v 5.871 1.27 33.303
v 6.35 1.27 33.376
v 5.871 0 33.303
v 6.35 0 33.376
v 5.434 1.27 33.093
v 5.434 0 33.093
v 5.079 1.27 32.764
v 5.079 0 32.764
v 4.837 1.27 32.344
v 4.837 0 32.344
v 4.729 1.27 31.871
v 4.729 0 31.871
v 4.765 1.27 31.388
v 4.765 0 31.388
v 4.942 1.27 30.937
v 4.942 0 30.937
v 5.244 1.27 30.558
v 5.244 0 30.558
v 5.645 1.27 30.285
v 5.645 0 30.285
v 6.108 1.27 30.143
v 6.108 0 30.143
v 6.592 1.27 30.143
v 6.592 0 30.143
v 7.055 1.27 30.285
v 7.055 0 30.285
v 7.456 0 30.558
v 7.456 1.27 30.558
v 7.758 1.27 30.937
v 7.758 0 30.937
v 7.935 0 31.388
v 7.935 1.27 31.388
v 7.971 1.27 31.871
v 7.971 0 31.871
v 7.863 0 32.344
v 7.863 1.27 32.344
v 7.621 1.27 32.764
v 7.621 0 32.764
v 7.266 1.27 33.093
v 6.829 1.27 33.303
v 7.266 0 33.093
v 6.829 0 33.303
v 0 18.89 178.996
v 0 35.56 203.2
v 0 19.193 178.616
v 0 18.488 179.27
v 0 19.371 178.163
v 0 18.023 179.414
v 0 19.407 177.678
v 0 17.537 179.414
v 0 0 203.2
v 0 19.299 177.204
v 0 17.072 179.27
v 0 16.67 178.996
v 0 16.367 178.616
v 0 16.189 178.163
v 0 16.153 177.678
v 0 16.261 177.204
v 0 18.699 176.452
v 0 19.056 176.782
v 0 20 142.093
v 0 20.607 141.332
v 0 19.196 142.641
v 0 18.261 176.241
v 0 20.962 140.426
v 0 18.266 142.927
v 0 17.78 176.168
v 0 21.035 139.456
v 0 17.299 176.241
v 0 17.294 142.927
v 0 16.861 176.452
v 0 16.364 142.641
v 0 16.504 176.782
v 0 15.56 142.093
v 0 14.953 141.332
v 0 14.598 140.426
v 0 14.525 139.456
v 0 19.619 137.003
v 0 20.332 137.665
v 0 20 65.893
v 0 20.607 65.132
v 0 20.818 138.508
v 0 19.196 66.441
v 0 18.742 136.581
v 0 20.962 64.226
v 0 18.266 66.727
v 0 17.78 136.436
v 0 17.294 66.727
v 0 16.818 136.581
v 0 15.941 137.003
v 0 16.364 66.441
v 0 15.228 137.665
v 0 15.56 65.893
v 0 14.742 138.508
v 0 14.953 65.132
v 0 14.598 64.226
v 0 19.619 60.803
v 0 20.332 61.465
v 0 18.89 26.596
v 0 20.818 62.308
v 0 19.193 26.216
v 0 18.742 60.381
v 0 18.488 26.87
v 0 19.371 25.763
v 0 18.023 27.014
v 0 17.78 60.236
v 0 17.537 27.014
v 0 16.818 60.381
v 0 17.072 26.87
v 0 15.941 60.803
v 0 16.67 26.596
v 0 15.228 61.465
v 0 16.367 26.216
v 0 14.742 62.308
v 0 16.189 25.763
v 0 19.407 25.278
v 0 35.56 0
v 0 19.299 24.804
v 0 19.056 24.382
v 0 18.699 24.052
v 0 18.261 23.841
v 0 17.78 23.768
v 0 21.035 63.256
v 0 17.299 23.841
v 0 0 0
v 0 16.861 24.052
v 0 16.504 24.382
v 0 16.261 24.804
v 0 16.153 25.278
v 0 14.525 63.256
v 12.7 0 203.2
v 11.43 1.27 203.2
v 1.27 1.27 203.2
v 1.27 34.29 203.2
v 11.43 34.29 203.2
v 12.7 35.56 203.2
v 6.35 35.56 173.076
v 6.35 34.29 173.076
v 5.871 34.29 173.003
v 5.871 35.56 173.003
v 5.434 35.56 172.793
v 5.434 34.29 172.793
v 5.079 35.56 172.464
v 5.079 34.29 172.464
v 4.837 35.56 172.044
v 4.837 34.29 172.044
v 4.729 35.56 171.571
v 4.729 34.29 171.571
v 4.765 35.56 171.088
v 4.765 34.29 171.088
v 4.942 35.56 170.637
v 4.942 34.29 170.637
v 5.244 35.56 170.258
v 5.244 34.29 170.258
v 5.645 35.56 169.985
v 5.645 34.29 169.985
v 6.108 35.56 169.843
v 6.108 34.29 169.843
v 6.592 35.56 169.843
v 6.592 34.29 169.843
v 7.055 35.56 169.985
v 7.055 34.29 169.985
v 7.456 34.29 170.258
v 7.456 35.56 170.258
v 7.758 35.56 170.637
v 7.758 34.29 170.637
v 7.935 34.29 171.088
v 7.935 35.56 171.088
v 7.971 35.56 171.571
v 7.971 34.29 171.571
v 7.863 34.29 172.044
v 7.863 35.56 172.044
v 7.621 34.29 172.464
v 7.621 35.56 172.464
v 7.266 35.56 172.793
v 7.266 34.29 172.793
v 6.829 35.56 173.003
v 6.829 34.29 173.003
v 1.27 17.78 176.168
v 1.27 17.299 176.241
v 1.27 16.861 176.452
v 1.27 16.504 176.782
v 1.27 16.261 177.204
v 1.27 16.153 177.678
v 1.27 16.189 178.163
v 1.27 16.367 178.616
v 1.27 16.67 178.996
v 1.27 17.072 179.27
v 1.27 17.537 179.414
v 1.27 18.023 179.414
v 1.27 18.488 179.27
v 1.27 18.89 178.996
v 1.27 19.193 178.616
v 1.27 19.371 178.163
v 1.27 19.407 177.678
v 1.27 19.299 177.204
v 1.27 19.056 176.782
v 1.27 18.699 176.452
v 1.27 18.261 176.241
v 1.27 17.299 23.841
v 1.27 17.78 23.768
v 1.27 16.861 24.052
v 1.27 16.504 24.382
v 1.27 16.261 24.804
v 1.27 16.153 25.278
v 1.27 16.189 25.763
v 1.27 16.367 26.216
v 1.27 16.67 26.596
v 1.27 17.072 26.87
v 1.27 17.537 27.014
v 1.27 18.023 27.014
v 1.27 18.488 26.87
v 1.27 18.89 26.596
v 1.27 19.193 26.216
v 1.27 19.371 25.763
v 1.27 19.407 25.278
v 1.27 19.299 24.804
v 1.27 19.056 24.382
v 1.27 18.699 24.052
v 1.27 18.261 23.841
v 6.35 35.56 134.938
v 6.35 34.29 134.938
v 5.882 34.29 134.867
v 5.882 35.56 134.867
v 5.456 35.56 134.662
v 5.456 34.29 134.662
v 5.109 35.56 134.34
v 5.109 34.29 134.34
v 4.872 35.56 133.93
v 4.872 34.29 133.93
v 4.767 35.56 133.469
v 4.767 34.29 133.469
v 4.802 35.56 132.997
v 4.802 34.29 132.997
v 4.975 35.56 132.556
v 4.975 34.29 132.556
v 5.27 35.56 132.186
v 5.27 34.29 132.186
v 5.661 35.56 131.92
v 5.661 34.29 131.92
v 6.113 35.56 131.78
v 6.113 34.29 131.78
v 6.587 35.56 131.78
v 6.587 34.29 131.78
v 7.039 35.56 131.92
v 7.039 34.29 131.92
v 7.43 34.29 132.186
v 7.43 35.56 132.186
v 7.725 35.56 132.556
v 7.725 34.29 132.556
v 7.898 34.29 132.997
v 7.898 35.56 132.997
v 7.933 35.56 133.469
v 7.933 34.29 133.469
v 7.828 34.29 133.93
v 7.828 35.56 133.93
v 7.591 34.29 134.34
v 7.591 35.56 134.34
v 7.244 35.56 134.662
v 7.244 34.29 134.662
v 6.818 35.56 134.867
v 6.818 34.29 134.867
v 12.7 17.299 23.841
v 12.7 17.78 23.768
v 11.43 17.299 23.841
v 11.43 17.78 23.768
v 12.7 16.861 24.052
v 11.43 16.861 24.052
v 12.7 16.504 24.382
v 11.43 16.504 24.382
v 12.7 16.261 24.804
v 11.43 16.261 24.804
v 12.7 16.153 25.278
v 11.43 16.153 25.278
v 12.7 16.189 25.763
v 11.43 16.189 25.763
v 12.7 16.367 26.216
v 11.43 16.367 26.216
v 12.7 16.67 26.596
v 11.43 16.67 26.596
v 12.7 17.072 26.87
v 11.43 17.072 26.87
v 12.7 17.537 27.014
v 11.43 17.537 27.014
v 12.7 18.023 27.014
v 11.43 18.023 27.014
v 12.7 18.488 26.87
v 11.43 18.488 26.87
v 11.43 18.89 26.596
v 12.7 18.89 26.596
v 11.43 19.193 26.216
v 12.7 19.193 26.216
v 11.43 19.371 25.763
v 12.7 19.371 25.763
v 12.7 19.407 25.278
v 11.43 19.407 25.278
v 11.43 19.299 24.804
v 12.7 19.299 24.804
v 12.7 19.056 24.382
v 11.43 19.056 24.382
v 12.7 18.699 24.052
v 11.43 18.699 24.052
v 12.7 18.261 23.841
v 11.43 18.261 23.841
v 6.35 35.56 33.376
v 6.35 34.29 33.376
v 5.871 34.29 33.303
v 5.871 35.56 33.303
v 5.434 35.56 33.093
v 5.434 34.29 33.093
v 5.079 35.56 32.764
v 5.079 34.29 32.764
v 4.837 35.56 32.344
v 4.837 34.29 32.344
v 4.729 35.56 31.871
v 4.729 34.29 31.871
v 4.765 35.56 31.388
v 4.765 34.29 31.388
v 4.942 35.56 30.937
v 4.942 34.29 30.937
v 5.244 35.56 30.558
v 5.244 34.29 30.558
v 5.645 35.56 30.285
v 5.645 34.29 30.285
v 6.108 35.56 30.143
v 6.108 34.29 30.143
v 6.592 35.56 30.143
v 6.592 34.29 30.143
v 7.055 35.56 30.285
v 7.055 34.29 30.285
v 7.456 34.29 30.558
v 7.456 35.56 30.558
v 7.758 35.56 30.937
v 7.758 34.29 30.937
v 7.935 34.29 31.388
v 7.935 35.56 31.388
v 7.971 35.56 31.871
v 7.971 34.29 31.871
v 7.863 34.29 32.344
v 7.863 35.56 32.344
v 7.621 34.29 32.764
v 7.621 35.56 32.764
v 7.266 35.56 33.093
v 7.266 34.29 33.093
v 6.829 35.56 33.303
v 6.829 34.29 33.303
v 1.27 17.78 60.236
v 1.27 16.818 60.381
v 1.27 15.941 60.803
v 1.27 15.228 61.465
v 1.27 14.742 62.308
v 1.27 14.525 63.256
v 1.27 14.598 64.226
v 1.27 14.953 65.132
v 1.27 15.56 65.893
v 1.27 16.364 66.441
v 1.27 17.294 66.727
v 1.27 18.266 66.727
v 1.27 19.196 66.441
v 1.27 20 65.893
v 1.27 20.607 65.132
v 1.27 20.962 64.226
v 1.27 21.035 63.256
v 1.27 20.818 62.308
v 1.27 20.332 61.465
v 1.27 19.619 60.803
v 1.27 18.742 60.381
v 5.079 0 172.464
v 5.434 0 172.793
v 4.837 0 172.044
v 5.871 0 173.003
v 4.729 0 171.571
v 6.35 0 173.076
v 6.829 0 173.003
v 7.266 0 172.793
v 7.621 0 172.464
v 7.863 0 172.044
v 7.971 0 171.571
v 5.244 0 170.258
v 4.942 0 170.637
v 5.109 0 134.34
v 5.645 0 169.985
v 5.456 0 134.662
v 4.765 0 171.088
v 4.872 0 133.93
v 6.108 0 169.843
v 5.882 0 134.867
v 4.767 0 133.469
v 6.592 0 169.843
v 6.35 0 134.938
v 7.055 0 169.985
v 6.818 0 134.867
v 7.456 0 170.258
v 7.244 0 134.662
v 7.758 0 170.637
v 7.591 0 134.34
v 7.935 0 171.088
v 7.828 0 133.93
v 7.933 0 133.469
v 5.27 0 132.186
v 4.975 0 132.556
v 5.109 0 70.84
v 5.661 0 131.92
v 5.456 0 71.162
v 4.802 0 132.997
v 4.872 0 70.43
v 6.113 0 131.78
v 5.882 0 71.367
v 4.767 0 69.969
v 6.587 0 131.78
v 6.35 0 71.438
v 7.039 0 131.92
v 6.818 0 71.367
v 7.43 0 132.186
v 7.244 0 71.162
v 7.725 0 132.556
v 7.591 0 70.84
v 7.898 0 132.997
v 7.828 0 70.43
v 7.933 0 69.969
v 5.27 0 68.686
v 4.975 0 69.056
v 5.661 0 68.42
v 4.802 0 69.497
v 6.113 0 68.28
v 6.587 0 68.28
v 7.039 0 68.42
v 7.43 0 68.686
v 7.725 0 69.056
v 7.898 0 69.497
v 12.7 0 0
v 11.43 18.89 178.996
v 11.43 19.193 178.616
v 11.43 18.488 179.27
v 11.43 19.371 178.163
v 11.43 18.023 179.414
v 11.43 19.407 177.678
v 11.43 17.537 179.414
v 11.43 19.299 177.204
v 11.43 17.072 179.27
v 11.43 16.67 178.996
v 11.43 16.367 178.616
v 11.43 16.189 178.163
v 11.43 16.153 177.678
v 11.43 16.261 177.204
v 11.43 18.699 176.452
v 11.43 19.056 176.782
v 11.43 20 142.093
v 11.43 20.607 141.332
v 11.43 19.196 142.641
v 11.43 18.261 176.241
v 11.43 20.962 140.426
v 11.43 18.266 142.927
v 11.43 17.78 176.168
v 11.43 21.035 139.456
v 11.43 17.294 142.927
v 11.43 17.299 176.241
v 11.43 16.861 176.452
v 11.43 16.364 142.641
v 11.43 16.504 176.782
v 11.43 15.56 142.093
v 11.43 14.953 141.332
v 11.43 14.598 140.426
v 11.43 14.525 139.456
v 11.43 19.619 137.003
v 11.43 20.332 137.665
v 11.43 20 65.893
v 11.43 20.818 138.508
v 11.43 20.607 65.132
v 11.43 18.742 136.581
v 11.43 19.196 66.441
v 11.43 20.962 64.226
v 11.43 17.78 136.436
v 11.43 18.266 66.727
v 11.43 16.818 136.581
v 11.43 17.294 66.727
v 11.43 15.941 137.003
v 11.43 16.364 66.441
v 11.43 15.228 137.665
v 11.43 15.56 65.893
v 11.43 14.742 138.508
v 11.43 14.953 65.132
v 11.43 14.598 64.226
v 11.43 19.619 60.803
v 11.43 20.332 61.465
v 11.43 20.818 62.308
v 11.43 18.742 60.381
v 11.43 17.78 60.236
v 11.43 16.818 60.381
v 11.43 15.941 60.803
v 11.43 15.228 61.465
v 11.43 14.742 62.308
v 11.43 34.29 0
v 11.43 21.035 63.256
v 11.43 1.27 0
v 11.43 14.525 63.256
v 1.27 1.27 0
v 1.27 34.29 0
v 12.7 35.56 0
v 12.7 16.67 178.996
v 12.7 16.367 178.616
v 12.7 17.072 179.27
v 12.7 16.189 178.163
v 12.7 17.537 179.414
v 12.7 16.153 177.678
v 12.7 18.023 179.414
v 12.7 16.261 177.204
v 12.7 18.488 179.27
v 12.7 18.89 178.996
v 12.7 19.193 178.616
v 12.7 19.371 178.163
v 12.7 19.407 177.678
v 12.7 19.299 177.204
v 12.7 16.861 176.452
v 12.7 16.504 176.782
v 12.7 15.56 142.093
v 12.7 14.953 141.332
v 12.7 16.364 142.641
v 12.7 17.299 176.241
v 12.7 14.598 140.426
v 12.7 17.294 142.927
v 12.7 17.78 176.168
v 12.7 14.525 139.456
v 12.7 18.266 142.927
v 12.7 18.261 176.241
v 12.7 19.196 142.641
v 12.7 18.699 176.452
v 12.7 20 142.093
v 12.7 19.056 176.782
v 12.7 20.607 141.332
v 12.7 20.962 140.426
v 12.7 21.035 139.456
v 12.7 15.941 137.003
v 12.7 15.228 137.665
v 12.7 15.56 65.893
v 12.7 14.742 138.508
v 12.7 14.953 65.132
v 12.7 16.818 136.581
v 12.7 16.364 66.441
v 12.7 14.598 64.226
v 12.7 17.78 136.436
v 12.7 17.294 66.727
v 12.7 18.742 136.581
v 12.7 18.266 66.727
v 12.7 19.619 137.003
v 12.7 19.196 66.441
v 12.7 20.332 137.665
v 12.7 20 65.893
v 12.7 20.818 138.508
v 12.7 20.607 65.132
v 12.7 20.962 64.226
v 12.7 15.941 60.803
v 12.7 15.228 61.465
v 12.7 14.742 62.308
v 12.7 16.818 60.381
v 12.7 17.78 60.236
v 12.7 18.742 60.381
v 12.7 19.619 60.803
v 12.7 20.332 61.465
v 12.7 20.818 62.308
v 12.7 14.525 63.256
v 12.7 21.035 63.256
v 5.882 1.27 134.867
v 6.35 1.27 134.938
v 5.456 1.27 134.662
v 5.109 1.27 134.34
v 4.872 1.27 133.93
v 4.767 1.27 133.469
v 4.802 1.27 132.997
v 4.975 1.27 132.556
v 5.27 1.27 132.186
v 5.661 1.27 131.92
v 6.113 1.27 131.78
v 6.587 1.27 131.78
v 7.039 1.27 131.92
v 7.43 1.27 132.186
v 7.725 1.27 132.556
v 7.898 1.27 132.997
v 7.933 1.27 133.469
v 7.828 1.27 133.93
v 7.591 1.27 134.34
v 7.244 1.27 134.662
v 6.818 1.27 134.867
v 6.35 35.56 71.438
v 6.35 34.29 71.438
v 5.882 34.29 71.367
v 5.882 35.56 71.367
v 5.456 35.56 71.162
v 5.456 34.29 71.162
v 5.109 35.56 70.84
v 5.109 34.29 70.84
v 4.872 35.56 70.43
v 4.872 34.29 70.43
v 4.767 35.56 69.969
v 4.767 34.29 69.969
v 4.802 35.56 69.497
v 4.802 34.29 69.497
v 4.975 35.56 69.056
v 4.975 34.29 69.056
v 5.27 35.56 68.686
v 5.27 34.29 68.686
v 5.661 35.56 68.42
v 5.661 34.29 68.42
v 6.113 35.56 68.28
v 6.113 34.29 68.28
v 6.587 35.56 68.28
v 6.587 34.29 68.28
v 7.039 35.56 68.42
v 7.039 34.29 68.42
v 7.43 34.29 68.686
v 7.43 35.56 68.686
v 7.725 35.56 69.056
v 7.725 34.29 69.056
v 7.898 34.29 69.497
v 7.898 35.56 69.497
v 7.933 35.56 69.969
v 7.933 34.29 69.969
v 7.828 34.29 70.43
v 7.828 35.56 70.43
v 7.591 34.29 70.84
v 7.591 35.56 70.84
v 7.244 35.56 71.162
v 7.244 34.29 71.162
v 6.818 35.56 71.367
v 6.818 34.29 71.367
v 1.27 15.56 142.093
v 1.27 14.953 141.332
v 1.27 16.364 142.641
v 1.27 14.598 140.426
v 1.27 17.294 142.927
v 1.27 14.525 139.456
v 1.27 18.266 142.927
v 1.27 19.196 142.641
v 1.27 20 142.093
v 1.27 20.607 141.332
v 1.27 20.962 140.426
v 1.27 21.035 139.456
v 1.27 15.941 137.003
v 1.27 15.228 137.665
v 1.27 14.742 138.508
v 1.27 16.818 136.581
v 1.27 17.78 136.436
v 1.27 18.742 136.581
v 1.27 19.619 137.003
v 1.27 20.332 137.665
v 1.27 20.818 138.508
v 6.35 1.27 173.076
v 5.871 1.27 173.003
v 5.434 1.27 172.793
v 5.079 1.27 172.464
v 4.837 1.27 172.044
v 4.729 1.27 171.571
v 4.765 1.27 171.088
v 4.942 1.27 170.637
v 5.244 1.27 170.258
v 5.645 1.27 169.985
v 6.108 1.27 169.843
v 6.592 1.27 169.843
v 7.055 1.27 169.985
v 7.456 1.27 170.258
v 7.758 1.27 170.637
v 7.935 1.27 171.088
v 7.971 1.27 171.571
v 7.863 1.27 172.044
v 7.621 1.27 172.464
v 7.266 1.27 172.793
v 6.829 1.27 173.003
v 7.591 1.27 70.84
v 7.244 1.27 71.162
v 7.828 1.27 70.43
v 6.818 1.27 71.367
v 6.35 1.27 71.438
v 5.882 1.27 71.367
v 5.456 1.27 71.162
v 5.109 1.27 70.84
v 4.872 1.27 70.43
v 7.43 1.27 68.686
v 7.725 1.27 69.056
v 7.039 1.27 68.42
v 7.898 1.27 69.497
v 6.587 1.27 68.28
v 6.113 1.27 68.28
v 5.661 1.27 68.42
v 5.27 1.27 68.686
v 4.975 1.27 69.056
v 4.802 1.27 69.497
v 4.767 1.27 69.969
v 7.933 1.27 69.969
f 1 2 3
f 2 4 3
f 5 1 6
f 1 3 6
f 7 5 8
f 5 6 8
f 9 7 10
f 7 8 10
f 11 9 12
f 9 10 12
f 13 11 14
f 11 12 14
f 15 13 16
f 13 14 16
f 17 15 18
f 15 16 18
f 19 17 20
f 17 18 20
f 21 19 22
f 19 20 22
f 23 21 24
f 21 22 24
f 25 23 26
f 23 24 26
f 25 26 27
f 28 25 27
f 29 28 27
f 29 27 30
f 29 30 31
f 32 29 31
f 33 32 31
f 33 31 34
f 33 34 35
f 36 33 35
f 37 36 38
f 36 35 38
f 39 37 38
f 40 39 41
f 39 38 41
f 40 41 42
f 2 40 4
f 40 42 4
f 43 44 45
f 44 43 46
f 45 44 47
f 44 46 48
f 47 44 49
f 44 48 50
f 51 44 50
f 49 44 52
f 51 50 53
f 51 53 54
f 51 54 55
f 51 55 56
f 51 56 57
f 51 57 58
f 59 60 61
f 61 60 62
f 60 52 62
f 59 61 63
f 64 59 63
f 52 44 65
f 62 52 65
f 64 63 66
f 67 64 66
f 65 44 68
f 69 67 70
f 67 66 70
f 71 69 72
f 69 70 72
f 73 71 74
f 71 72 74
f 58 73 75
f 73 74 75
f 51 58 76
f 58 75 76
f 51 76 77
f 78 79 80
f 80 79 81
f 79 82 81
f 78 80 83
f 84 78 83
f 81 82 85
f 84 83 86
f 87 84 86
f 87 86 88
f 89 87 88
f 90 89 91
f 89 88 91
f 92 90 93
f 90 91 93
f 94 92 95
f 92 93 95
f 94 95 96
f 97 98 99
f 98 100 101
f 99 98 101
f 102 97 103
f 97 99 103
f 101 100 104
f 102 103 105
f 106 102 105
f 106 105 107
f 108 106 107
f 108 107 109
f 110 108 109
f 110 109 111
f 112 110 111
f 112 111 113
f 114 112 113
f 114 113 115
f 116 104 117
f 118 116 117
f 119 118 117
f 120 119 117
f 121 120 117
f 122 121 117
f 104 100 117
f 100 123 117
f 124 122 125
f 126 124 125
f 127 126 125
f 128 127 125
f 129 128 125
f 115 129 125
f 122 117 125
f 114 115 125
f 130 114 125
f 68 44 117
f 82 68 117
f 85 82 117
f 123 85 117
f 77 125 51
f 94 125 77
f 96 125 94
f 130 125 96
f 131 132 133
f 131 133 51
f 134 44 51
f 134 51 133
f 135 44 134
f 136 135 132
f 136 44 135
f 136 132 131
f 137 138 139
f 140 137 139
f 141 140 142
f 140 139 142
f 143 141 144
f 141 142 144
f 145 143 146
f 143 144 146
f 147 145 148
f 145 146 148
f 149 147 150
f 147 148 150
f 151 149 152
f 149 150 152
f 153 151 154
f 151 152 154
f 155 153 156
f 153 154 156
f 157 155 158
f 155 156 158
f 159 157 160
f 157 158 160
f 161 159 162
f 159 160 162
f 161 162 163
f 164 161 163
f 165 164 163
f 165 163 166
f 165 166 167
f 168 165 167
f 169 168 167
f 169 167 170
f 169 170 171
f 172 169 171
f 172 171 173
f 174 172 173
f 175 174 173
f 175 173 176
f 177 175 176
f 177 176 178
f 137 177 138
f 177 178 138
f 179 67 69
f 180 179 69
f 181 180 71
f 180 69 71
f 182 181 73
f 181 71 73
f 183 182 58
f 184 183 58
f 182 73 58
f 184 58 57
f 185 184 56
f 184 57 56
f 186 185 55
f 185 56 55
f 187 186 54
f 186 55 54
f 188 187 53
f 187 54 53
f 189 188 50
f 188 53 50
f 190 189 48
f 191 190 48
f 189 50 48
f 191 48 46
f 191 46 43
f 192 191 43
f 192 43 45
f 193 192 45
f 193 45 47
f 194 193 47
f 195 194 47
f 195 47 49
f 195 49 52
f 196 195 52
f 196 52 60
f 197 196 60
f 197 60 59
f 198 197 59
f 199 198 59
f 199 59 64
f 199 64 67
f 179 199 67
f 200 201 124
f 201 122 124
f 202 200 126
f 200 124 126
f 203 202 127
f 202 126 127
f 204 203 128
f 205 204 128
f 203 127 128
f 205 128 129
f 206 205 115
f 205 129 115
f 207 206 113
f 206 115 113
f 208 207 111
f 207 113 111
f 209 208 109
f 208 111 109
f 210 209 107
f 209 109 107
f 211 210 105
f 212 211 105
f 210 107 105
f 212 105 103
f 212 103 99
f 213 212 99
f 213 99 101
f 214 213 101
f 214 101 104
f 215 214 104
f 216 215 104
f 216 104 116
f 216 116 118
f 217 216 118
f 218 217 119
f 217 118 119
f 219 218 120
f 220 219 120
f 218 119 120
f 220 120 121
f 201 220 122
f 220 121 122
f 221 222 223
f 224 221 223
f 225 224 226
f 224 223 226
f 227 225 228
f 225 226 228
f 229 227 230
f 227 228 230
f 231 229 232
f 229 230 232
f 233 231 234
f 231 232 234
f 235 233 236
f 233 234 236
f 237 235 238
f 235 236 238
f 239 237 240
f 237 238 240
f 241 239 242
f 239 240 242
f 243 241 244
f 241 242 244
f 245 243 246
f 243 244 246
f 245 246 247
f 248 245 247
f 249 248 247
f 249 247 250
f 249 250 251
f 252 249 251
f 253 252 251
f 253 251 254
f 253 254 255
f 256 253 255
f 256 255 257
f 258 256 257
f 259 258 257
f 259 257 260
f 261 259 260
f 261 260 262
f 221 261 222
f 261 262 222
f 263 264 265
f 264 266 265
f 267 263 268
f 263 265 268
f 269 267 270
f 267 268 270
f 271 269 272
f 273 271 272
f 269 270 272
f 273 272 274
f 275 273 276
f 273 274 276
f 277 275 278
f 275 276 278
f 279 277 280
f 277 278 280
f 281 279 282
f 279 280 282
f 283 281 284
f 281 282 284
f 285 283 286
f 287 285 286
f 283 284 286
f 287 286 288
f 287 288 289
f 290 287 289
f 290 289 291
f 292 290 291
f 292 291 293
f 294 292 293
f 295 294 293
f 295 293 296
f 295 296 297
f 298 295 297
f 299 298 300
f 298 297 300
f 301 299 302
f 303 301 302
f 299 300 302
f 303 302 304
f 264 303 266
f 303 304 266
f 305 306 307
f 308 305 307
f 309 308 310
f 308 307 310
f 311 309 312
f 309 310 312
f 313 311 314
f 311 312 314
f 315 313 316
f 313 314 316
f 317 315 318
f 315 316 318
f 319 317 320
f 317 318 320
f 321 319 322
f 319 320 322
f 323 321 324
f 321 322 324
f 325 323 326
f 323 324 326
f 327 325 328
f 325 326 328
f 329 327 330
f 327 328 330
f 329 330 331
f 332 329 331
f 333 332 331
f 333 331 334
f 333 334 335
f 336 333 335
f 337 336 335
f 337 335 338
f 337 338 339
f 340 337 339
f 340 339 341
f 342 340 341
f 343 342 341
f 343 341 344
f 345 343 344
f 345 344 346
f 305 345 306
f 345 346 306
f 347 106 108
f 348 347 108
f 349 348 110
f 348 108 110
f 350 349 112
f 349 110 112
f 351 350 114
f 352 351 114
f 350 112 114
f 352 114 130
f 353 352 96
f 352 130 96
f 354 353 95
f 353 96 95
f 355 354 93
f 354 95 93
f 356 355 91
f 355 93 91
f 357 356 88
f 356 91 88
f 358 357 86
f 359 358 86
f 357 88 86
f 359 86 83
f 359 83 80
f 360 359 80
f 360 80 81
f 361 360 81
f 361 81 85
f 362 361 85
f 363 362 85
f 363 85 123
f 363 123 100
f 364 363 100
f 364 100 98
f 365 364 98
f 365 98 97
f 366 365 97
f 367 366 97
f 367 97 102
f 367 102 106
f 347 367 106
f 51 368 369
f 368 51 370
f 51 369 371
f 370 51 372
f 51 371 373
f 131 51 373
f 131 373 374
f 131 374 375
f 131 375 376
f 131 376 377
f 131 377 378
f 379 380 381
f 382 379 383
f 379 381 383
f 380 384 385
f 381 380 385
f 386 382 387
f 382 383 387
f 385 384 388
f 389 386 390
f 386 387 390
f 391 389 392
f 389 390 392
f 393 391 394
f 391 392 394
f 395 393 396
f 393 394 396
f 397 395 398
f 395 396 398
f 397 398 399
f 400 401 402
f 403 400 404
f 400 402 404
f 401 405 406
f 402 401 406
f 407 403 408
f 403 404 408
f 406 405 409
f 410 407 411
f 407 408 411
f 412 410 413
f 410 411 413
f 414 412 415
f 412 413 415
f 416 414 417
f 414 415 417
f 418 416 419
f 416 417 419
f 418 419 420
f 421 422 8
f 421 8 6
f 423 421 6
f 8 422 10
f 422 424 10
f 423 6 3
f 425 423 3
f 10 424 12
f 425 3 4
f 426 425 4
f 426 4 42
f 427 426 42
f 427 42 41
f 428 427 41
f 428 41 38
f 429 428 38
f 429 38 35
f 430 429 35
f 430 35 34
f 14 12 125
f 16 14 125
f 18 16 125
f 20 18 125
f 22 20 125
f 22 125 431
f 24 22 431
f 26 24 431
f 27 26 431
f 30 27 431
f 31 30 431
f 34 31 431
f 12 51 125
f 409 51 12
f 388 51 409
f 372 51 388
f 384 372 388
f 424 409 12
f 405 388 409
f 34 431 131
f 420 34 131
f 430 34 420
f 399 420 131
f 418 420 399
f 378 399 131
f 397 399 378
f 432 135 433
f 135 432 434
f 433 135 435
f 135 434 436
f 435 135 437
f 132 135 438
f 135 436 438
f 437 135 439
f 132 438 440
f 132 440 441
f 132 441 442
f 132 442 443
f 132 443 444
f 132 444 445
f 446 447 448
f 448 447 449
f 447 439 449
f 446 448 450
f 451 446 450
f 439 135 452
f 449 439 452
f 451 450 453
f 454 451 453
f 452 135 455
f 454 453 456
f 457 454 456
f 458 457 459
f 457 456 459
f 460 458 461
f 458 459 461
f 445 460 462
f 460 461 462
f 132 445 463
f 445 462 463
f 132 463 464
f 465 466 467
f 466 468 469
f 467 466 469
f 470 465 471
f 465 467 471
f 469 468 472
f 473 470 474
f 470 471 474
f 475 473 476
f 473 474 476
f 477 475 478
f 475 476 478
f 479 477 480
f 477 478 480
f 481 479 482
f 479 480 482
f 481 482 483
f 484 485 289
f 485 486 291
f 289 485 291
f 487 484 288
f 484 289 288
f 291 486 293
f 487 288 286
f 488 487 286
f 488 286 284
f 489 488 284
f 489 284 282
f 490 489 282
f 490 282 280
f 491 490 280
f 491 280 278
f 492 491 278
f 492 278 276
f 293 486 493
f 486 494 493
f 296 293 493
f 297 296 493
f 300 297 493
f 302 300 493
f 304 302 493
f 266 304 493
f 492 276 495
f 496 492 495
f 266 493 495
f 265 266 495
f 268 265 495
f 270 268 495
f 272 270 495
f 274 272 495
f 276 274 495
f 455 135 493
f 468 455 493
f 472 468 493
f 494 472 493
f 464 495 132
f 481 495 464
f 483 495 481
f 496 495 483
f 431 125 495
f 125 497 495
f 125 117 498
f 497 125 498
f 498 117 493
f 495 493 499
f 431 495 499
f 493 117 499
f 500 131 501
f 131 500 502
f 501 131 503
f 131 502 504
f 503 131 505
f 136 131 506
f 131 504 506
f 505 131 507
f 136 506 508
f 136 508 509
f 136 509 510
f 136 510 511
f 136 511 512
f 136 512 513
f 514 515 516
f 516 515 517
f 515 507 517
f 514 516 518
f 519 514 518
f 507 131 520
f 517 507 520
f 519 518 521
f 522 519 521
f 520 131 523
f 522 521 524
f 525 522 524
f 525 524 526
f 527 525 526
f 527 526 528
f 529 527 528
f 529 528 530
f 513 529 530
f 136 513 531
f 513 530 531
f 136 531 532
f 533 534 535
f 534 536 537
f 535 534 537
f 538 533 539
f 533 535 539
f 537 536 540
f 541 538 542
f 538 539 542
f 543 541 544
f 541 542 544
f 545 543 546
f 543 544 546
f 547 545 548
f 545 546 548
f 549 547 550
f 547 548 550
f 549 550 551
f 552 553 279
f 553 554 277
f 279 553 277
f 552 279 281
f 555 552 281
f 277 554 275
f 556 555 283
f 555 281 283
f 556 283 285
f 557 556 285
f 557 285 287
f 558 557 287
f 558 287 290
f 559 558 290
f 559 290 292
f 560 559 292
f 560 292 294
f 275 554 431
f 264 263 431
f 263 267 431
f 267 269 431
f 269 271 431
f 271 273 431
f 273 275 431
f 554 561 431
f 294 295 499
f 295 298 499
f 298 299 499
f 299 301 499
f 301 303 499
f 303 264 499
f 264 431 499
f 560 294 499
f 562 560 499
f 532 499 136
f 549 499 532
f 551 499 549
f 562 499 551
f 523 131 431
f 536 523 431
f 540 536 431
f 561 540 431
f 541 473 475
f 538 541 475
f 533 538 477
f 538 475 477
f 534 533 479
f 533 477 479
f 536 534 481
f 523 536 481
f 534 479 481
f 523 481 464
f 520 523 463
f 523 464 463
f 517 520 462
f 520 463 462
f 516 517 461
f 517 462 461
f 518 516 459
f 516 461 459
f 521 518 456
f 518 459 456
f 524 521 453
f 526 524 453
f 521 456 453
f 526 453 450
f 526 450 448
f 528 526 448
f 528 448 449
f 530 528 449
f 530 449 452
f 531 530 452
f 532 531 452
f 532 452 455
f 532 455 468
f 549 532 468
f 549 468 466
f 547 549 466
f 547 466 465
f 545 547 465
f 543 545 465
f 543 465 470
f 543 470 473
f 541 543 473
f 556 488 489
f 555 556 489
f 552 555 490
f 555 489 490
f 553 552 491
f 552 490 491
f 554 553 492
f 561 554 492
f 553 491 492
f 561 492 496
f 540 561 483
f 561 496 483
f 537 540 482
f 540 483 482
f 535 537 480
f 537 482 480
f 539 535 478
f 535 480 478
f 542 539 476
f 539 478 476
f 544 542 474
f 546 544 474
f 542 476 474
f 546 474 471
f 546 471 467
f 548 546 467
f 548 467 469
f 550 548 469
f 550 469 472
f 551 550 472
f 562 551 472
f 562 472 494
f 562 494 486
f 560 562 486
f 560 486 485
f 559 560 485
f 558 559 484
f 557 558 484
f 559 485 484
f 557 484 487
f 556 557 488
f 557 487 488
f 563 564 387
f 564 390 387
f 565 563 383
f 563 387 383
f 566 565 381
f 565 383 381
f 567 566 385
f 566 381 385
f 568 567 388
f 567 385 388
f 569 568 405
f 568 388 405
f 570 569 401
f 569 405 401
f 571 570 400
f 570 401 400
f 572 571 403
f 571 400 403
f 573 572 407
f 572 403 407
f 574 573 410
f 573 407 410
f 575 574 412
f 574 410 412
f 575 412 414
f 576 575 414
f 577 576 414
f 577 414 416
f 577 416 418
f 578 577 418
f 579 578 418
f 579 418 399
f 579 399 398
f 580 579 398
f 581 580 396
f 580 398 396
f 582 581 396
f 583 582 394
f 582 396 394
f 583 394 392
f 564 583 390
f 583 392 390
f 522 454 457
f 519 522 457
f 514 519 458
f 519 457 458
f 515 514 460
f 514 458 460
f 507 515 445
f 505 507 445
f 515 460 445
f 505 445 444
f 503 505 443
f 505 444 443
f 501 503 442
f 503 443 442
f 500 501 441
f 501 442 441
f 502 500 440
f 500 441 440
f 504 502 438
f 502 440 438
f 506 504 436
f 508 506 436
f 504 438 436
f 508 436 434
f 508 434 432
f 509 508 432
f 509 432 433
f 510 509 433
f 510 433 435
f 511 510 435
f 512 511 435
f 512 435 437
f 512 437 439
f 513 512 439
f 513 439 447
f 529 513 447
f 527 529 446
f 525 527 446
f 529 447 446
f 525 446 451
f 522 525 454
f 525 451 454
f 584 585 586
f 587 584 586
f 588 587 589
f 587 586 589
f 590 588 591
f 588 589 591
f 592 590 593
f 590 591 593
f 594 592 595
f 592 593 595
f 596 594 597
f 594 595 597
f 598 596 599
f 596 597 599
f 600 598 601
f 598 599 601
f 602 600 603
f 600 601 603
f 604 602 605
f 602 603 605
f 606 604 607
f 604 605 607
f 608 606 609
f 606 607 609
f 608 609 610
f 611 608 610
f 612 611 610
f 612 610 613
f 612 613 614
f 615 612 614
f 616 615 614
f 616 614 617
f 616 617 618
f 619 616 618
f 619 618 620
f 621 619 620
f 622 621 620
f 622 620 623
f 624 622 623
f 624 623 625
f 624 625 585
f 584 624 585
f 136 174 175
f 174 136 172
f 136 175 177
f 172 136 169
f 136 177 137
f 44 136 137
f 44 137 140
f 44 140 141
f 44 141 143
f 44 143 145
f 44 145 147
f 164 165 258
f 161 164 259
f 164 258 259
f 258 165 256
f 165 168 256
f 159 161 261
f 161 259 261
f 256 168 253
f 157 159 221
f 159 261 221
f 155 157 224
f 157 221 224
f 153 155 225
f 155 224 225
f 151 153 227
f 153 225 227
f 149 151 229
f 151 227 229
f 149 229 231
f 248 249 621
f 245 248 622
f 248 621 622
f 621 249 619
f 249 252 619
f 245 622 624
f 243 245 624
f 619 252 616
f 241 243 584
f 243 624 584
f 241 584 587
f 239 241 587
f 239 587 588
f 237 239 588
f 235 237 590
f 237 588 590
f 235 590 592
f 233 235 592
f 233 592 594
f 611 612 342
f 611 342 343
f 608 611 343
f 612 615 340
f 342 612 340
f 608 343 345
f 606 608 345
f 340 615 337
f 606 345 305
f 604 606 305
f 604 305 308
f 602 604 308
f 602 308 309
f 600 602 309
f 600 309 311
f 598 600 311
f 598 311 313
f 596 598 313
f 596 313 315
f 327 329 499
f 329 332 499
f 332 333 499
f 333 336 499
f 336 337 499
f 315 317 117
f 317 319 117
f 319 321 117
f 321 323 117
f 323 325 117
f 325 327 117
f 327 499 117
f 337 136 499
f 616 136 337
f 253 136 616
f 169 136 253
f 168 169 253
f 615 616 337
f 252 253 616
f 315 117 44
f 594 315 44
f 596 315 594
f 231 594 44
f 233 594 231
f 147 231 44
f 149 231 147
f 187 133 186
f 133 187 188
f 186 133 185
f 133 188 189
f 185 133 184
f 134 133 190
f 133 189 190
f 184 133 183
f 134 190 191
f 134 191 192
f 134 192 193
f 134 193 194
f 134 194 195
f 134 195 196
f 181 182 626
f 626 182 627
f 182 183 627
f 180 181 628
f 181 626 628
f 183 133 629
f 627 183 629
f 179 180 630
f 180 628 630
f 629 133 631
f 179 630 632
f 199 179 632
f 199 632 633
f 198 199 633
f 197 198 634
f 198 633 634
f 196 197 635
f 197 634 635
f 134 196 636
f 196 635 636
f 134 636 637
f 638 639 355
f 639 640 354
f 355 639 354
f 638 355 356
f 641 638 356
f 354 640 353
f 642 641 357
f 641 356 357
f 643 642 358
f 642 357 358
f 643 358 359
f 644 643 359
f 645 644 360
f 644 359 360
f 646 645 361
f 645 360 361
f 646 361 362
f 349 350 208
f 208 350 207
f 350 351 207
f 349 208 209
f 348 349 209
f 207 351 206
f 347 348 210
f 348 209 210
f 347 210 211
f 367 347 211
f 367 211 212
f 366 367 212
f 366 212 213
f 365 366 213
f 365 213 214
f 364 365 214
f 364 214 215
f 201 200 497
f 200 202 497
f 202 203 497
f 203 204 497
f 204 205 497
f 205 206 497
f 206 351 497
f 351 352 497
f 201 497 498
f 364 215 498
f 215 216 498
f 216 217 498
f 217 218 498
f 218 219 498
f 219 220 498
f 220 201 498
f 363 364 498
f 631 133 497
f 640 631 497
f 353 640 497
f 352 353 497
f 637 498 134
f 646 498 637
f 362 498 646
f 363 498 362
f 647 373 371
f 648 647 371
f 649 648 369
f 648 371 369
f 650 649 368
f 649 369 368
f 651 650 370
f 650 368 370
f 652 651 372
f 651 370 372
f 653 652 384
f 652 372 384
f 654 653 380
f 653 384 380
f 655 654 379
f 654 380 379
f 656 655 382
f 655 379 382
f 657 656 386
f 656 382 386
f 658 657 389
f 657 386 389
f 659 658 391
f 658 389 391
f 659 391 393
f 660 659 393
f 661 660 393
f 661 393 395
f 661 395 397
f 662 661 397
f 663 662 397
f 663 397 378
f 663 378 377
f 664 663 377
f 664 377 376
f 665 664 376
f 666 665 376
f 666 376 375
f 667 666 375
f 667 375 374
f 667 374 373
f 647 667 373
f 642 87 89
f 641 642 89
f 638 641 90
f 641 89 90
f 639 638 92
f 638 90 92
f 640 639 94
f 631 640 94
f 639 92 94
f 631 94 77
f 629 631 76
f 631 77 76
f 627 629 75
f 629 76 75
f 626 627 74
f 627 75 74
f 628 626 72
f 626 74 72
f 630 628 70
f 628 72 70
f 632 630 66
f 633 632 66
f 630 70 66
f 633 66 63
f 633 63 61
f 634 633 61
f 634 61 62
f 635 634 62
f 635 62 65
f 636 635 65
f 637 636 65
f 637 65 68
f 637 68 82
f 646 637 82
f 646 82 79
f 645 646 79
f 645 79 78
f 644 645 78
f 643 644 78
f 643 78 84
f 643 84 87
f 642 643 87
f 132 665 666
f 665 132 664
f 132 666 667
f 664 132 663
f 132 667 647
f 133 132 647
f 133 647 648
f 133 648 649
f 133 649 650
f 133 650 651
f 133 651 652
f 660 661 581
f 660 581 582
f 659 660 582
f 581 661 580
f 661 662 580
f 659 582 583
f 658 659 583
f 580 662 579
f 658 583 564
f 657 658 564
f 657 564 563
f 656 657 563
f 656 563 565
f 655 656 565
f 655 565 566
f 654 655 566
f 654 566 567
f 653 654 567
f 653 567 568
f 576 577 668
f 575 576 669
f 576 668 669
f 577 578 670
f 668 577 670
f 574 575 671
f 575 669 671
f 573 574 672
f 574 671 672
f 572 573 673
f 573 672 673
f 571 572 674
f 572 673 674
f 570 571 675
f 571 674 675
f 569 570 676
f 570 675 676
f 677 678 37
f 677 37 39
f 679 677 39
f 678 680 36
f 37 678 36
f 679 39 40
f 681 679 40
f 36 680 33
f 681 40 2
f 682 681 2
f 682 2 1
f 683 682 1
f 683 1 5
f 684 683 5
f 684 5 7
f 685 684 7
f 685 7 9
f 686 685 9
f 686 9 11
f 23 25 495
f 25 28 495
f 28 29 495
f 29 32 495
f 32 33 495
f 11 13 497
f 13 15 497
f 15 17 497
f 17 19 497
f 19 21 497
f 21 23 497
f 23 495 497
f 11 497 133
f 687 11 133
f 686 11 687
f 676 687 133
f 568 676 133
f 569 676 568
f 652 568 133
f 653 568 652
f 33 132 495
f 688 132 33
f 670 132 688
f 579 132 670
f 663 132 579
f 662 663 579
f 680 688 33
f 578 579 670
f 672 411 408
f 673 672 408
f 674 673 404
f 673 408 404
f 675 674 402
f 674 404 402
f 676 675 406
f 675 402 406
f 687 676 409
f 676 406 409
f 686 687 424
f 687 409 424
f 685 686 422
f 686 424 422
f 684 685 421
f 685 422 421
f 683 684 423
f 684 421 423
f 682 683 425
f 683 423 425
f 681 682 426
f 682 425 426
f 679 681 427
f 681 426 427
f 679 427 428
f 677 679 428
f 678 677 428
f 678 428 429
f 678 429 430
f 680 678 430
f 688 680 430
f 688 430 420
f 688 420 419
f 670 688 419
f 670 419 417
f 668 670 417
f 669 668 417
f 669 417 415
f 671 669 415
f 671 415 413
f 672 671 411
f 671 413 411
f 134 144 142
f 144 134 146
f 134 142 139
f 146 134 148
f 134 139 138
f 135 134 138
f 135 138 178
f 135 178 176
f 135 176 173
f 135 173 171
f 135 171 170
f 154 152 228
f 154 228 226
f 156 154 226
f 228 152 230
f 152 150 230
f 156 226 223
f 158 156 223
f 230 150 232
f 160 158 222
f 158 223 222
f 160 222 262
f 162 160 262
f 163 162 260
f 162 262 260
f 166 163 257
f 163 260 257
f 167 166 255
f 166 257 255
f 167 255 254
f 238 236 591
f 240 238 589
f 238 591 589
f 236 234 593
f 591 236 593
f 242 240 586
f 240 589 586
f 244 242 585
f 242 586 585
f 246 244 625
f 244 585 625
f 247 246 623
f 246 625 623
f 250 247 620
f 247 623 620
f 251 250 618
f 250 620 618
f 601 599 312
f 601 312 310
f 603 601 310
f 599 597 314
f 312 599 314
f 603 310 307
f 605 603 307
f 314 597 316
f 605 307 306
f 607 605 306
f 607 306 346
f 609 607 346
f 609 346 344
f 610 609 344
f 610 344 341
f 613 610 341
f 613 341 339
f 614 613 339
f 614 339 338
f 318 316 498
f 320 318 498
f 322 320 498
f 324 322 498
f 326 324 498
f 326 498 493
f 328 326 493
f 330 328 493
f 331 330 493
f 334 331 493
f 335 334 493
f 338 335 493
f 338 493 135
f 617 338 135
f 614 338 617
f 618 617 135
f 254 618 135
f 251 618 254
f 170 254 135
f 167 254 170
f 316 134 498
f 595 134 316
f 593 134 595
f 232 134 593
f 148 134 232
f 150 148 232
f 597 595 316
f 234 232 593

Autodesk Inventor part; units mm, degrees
ref_plane "YZ Plane" through (0, 0, 0) normal (1, 0, 0) x (0, 1, 0)
ref_plane "XZ Plane" through (0, 0, 0) normal (0, 1, 0) x (-1, 0, 0)
ref_plane "XY Plane" through (0, 0, 0) normal (0, 0, 1) x (1, 0, 0)
sketch "Sketch1" plane through (0, 0, 0) normal (0, 0, 1) x (1, 0, 0)
  line L0 (0, 0) -> (12.7, 0)
  line L1 (12.7, 0) -> (12.7, 35.56)
  line L2 (12.7, 35.56) -> (0, 35.56)
  line L3 (0, 35.56) -> (0, 0)
  line L4 (1.27, 34.29) -> (11.43, 34.29)
  line L5 (11.43, 34.29) -> (11.43, 1.27)
  line L6 (11.43, 1.27) -> (1.27, 1.27)
  line L7 (1.27, 1.27) -> (1.27, 34.29)
  dimension "d0" = 35.56
  dimension "d1" = 12.7
  dimension "d2" = 1.27
extrude "Extrusion1" add sketch "Sketch1" along normal blind 203.2
sketch "Sketch2" plane through (12.7, 0, 0) normal (1, 0, 0) x (0, 0, -1)
  line L0 (-168.1044, 17.78) -> (-15.152, 17.78) construction
  line L1 (0, 0) -> (-203.2, 0) construction
  line L2 (-203.2, 0) -> (-203.2, 35.56) projected
  line L3 (0, 0) -> (0, 35.56) projected
  point P0 (-177.8, 17.78)
  point P1 (-25.4, 17.78)
  dimension "d5" = 17.78
  dimension "d6" = 25.4
  dimension "d7" = 25.4
hole "Hole1" at (12.7, 17.78, 177.8) at (12.7, 17.78, 25.4) direction (-1, 0, 0) diameter 3.2639 end through all
sketch "Sketch3" plane through (12.7, 0, 0) normal (1, 0, 0) x (0, 0, -1)
  circle A0 centre (-177.8, 17.78) radius 1.632 projected
  circle A1 centre (-25.4, 17.78) radius 1.632 projected
  line L0 (-214.4228, 17.78) -> (16.7128, 17.78) construction
  point P0 (0, 0)
  point P1 (-177.8, 17.78)
  point P2 (-25.4, 17.78)
  point P3 (-139.7, 17.78)
  point P4 (-63.5, 17.78)
  dimension "d18" = 38.1
  dimension "d19" = 38.1
hole "Hole2" at (12.7, 17.78, 139.7) at (12.7, 17.78, 63.5) direction (-1, 0, 0) diameter 6.5278 end through all
sketch "Sketch4" plane through (0, 35.56, 0) normal (0, 1, 0) x (1, 0, 0)
  line L0 (6.35, 23.2485) -> (6.35, -226.9955) construction
  line L1 (12.7, 0) -> (12.7, -203.2) construction
  line L2 (12.7, 0) -> (0, 0) projected
  line L3 (0, 0) -> (0, -203.2) projected
  line L4 (12.7, -203.2) -> (0, -203.2) projected
  line L5 (12.7, 0) -> (12.7, -203.2) projected
  point P0 (0, 0)
  point P1 (6.35, -31.75)
  point P2 (6.35, -171.45)
  dimension "d27" = 6.35
  dimension "d28" = 31.75
  dimension "d29" = 31.75
hole "Hole3" at (6.35, 35.56, 31.75) at (6.35, 35.56, 171.45) direction (0, -1, 0) diameter 3.2512 end through all
sketch "Sketch5" plane through (0, 35.56, 0) normal (0, 1, 0) x (1, 0, 0)
  line L0 (-85.4565, -101.6) -> (166.25, -101.6) construction
  line L1 (12.7, 0) -> (0, 0) construction
  line L2 (6.35, 16.7541) -> (6.35, -272.8802) construction
  line L3 (0, 0) -> (0, -203.2) construction
  line L4 (-54.5343, -133.35) -> (67.2343, -133.35) construction
  line L5 (-32.5067, -69.85) -> (120.6854, -69.85) construction
  line L6 (12.7, -203.2) -> (0, -203.2) construction
  point P0 (6.35, -69.85)
  point P1 (6.35, -133.35)
  dimension "d37" = 101.6
  dimension "d38" = 6.35
  dimension "d39" = 31.75
  dimension "d40" = 31.75
hole "Hole4" at (6.35, 35.56, 69.85) at (6.35, 35.56, 133.35) direction (0, -1, 0) diameter 3.175 end through all
properties part number "000101-1"
